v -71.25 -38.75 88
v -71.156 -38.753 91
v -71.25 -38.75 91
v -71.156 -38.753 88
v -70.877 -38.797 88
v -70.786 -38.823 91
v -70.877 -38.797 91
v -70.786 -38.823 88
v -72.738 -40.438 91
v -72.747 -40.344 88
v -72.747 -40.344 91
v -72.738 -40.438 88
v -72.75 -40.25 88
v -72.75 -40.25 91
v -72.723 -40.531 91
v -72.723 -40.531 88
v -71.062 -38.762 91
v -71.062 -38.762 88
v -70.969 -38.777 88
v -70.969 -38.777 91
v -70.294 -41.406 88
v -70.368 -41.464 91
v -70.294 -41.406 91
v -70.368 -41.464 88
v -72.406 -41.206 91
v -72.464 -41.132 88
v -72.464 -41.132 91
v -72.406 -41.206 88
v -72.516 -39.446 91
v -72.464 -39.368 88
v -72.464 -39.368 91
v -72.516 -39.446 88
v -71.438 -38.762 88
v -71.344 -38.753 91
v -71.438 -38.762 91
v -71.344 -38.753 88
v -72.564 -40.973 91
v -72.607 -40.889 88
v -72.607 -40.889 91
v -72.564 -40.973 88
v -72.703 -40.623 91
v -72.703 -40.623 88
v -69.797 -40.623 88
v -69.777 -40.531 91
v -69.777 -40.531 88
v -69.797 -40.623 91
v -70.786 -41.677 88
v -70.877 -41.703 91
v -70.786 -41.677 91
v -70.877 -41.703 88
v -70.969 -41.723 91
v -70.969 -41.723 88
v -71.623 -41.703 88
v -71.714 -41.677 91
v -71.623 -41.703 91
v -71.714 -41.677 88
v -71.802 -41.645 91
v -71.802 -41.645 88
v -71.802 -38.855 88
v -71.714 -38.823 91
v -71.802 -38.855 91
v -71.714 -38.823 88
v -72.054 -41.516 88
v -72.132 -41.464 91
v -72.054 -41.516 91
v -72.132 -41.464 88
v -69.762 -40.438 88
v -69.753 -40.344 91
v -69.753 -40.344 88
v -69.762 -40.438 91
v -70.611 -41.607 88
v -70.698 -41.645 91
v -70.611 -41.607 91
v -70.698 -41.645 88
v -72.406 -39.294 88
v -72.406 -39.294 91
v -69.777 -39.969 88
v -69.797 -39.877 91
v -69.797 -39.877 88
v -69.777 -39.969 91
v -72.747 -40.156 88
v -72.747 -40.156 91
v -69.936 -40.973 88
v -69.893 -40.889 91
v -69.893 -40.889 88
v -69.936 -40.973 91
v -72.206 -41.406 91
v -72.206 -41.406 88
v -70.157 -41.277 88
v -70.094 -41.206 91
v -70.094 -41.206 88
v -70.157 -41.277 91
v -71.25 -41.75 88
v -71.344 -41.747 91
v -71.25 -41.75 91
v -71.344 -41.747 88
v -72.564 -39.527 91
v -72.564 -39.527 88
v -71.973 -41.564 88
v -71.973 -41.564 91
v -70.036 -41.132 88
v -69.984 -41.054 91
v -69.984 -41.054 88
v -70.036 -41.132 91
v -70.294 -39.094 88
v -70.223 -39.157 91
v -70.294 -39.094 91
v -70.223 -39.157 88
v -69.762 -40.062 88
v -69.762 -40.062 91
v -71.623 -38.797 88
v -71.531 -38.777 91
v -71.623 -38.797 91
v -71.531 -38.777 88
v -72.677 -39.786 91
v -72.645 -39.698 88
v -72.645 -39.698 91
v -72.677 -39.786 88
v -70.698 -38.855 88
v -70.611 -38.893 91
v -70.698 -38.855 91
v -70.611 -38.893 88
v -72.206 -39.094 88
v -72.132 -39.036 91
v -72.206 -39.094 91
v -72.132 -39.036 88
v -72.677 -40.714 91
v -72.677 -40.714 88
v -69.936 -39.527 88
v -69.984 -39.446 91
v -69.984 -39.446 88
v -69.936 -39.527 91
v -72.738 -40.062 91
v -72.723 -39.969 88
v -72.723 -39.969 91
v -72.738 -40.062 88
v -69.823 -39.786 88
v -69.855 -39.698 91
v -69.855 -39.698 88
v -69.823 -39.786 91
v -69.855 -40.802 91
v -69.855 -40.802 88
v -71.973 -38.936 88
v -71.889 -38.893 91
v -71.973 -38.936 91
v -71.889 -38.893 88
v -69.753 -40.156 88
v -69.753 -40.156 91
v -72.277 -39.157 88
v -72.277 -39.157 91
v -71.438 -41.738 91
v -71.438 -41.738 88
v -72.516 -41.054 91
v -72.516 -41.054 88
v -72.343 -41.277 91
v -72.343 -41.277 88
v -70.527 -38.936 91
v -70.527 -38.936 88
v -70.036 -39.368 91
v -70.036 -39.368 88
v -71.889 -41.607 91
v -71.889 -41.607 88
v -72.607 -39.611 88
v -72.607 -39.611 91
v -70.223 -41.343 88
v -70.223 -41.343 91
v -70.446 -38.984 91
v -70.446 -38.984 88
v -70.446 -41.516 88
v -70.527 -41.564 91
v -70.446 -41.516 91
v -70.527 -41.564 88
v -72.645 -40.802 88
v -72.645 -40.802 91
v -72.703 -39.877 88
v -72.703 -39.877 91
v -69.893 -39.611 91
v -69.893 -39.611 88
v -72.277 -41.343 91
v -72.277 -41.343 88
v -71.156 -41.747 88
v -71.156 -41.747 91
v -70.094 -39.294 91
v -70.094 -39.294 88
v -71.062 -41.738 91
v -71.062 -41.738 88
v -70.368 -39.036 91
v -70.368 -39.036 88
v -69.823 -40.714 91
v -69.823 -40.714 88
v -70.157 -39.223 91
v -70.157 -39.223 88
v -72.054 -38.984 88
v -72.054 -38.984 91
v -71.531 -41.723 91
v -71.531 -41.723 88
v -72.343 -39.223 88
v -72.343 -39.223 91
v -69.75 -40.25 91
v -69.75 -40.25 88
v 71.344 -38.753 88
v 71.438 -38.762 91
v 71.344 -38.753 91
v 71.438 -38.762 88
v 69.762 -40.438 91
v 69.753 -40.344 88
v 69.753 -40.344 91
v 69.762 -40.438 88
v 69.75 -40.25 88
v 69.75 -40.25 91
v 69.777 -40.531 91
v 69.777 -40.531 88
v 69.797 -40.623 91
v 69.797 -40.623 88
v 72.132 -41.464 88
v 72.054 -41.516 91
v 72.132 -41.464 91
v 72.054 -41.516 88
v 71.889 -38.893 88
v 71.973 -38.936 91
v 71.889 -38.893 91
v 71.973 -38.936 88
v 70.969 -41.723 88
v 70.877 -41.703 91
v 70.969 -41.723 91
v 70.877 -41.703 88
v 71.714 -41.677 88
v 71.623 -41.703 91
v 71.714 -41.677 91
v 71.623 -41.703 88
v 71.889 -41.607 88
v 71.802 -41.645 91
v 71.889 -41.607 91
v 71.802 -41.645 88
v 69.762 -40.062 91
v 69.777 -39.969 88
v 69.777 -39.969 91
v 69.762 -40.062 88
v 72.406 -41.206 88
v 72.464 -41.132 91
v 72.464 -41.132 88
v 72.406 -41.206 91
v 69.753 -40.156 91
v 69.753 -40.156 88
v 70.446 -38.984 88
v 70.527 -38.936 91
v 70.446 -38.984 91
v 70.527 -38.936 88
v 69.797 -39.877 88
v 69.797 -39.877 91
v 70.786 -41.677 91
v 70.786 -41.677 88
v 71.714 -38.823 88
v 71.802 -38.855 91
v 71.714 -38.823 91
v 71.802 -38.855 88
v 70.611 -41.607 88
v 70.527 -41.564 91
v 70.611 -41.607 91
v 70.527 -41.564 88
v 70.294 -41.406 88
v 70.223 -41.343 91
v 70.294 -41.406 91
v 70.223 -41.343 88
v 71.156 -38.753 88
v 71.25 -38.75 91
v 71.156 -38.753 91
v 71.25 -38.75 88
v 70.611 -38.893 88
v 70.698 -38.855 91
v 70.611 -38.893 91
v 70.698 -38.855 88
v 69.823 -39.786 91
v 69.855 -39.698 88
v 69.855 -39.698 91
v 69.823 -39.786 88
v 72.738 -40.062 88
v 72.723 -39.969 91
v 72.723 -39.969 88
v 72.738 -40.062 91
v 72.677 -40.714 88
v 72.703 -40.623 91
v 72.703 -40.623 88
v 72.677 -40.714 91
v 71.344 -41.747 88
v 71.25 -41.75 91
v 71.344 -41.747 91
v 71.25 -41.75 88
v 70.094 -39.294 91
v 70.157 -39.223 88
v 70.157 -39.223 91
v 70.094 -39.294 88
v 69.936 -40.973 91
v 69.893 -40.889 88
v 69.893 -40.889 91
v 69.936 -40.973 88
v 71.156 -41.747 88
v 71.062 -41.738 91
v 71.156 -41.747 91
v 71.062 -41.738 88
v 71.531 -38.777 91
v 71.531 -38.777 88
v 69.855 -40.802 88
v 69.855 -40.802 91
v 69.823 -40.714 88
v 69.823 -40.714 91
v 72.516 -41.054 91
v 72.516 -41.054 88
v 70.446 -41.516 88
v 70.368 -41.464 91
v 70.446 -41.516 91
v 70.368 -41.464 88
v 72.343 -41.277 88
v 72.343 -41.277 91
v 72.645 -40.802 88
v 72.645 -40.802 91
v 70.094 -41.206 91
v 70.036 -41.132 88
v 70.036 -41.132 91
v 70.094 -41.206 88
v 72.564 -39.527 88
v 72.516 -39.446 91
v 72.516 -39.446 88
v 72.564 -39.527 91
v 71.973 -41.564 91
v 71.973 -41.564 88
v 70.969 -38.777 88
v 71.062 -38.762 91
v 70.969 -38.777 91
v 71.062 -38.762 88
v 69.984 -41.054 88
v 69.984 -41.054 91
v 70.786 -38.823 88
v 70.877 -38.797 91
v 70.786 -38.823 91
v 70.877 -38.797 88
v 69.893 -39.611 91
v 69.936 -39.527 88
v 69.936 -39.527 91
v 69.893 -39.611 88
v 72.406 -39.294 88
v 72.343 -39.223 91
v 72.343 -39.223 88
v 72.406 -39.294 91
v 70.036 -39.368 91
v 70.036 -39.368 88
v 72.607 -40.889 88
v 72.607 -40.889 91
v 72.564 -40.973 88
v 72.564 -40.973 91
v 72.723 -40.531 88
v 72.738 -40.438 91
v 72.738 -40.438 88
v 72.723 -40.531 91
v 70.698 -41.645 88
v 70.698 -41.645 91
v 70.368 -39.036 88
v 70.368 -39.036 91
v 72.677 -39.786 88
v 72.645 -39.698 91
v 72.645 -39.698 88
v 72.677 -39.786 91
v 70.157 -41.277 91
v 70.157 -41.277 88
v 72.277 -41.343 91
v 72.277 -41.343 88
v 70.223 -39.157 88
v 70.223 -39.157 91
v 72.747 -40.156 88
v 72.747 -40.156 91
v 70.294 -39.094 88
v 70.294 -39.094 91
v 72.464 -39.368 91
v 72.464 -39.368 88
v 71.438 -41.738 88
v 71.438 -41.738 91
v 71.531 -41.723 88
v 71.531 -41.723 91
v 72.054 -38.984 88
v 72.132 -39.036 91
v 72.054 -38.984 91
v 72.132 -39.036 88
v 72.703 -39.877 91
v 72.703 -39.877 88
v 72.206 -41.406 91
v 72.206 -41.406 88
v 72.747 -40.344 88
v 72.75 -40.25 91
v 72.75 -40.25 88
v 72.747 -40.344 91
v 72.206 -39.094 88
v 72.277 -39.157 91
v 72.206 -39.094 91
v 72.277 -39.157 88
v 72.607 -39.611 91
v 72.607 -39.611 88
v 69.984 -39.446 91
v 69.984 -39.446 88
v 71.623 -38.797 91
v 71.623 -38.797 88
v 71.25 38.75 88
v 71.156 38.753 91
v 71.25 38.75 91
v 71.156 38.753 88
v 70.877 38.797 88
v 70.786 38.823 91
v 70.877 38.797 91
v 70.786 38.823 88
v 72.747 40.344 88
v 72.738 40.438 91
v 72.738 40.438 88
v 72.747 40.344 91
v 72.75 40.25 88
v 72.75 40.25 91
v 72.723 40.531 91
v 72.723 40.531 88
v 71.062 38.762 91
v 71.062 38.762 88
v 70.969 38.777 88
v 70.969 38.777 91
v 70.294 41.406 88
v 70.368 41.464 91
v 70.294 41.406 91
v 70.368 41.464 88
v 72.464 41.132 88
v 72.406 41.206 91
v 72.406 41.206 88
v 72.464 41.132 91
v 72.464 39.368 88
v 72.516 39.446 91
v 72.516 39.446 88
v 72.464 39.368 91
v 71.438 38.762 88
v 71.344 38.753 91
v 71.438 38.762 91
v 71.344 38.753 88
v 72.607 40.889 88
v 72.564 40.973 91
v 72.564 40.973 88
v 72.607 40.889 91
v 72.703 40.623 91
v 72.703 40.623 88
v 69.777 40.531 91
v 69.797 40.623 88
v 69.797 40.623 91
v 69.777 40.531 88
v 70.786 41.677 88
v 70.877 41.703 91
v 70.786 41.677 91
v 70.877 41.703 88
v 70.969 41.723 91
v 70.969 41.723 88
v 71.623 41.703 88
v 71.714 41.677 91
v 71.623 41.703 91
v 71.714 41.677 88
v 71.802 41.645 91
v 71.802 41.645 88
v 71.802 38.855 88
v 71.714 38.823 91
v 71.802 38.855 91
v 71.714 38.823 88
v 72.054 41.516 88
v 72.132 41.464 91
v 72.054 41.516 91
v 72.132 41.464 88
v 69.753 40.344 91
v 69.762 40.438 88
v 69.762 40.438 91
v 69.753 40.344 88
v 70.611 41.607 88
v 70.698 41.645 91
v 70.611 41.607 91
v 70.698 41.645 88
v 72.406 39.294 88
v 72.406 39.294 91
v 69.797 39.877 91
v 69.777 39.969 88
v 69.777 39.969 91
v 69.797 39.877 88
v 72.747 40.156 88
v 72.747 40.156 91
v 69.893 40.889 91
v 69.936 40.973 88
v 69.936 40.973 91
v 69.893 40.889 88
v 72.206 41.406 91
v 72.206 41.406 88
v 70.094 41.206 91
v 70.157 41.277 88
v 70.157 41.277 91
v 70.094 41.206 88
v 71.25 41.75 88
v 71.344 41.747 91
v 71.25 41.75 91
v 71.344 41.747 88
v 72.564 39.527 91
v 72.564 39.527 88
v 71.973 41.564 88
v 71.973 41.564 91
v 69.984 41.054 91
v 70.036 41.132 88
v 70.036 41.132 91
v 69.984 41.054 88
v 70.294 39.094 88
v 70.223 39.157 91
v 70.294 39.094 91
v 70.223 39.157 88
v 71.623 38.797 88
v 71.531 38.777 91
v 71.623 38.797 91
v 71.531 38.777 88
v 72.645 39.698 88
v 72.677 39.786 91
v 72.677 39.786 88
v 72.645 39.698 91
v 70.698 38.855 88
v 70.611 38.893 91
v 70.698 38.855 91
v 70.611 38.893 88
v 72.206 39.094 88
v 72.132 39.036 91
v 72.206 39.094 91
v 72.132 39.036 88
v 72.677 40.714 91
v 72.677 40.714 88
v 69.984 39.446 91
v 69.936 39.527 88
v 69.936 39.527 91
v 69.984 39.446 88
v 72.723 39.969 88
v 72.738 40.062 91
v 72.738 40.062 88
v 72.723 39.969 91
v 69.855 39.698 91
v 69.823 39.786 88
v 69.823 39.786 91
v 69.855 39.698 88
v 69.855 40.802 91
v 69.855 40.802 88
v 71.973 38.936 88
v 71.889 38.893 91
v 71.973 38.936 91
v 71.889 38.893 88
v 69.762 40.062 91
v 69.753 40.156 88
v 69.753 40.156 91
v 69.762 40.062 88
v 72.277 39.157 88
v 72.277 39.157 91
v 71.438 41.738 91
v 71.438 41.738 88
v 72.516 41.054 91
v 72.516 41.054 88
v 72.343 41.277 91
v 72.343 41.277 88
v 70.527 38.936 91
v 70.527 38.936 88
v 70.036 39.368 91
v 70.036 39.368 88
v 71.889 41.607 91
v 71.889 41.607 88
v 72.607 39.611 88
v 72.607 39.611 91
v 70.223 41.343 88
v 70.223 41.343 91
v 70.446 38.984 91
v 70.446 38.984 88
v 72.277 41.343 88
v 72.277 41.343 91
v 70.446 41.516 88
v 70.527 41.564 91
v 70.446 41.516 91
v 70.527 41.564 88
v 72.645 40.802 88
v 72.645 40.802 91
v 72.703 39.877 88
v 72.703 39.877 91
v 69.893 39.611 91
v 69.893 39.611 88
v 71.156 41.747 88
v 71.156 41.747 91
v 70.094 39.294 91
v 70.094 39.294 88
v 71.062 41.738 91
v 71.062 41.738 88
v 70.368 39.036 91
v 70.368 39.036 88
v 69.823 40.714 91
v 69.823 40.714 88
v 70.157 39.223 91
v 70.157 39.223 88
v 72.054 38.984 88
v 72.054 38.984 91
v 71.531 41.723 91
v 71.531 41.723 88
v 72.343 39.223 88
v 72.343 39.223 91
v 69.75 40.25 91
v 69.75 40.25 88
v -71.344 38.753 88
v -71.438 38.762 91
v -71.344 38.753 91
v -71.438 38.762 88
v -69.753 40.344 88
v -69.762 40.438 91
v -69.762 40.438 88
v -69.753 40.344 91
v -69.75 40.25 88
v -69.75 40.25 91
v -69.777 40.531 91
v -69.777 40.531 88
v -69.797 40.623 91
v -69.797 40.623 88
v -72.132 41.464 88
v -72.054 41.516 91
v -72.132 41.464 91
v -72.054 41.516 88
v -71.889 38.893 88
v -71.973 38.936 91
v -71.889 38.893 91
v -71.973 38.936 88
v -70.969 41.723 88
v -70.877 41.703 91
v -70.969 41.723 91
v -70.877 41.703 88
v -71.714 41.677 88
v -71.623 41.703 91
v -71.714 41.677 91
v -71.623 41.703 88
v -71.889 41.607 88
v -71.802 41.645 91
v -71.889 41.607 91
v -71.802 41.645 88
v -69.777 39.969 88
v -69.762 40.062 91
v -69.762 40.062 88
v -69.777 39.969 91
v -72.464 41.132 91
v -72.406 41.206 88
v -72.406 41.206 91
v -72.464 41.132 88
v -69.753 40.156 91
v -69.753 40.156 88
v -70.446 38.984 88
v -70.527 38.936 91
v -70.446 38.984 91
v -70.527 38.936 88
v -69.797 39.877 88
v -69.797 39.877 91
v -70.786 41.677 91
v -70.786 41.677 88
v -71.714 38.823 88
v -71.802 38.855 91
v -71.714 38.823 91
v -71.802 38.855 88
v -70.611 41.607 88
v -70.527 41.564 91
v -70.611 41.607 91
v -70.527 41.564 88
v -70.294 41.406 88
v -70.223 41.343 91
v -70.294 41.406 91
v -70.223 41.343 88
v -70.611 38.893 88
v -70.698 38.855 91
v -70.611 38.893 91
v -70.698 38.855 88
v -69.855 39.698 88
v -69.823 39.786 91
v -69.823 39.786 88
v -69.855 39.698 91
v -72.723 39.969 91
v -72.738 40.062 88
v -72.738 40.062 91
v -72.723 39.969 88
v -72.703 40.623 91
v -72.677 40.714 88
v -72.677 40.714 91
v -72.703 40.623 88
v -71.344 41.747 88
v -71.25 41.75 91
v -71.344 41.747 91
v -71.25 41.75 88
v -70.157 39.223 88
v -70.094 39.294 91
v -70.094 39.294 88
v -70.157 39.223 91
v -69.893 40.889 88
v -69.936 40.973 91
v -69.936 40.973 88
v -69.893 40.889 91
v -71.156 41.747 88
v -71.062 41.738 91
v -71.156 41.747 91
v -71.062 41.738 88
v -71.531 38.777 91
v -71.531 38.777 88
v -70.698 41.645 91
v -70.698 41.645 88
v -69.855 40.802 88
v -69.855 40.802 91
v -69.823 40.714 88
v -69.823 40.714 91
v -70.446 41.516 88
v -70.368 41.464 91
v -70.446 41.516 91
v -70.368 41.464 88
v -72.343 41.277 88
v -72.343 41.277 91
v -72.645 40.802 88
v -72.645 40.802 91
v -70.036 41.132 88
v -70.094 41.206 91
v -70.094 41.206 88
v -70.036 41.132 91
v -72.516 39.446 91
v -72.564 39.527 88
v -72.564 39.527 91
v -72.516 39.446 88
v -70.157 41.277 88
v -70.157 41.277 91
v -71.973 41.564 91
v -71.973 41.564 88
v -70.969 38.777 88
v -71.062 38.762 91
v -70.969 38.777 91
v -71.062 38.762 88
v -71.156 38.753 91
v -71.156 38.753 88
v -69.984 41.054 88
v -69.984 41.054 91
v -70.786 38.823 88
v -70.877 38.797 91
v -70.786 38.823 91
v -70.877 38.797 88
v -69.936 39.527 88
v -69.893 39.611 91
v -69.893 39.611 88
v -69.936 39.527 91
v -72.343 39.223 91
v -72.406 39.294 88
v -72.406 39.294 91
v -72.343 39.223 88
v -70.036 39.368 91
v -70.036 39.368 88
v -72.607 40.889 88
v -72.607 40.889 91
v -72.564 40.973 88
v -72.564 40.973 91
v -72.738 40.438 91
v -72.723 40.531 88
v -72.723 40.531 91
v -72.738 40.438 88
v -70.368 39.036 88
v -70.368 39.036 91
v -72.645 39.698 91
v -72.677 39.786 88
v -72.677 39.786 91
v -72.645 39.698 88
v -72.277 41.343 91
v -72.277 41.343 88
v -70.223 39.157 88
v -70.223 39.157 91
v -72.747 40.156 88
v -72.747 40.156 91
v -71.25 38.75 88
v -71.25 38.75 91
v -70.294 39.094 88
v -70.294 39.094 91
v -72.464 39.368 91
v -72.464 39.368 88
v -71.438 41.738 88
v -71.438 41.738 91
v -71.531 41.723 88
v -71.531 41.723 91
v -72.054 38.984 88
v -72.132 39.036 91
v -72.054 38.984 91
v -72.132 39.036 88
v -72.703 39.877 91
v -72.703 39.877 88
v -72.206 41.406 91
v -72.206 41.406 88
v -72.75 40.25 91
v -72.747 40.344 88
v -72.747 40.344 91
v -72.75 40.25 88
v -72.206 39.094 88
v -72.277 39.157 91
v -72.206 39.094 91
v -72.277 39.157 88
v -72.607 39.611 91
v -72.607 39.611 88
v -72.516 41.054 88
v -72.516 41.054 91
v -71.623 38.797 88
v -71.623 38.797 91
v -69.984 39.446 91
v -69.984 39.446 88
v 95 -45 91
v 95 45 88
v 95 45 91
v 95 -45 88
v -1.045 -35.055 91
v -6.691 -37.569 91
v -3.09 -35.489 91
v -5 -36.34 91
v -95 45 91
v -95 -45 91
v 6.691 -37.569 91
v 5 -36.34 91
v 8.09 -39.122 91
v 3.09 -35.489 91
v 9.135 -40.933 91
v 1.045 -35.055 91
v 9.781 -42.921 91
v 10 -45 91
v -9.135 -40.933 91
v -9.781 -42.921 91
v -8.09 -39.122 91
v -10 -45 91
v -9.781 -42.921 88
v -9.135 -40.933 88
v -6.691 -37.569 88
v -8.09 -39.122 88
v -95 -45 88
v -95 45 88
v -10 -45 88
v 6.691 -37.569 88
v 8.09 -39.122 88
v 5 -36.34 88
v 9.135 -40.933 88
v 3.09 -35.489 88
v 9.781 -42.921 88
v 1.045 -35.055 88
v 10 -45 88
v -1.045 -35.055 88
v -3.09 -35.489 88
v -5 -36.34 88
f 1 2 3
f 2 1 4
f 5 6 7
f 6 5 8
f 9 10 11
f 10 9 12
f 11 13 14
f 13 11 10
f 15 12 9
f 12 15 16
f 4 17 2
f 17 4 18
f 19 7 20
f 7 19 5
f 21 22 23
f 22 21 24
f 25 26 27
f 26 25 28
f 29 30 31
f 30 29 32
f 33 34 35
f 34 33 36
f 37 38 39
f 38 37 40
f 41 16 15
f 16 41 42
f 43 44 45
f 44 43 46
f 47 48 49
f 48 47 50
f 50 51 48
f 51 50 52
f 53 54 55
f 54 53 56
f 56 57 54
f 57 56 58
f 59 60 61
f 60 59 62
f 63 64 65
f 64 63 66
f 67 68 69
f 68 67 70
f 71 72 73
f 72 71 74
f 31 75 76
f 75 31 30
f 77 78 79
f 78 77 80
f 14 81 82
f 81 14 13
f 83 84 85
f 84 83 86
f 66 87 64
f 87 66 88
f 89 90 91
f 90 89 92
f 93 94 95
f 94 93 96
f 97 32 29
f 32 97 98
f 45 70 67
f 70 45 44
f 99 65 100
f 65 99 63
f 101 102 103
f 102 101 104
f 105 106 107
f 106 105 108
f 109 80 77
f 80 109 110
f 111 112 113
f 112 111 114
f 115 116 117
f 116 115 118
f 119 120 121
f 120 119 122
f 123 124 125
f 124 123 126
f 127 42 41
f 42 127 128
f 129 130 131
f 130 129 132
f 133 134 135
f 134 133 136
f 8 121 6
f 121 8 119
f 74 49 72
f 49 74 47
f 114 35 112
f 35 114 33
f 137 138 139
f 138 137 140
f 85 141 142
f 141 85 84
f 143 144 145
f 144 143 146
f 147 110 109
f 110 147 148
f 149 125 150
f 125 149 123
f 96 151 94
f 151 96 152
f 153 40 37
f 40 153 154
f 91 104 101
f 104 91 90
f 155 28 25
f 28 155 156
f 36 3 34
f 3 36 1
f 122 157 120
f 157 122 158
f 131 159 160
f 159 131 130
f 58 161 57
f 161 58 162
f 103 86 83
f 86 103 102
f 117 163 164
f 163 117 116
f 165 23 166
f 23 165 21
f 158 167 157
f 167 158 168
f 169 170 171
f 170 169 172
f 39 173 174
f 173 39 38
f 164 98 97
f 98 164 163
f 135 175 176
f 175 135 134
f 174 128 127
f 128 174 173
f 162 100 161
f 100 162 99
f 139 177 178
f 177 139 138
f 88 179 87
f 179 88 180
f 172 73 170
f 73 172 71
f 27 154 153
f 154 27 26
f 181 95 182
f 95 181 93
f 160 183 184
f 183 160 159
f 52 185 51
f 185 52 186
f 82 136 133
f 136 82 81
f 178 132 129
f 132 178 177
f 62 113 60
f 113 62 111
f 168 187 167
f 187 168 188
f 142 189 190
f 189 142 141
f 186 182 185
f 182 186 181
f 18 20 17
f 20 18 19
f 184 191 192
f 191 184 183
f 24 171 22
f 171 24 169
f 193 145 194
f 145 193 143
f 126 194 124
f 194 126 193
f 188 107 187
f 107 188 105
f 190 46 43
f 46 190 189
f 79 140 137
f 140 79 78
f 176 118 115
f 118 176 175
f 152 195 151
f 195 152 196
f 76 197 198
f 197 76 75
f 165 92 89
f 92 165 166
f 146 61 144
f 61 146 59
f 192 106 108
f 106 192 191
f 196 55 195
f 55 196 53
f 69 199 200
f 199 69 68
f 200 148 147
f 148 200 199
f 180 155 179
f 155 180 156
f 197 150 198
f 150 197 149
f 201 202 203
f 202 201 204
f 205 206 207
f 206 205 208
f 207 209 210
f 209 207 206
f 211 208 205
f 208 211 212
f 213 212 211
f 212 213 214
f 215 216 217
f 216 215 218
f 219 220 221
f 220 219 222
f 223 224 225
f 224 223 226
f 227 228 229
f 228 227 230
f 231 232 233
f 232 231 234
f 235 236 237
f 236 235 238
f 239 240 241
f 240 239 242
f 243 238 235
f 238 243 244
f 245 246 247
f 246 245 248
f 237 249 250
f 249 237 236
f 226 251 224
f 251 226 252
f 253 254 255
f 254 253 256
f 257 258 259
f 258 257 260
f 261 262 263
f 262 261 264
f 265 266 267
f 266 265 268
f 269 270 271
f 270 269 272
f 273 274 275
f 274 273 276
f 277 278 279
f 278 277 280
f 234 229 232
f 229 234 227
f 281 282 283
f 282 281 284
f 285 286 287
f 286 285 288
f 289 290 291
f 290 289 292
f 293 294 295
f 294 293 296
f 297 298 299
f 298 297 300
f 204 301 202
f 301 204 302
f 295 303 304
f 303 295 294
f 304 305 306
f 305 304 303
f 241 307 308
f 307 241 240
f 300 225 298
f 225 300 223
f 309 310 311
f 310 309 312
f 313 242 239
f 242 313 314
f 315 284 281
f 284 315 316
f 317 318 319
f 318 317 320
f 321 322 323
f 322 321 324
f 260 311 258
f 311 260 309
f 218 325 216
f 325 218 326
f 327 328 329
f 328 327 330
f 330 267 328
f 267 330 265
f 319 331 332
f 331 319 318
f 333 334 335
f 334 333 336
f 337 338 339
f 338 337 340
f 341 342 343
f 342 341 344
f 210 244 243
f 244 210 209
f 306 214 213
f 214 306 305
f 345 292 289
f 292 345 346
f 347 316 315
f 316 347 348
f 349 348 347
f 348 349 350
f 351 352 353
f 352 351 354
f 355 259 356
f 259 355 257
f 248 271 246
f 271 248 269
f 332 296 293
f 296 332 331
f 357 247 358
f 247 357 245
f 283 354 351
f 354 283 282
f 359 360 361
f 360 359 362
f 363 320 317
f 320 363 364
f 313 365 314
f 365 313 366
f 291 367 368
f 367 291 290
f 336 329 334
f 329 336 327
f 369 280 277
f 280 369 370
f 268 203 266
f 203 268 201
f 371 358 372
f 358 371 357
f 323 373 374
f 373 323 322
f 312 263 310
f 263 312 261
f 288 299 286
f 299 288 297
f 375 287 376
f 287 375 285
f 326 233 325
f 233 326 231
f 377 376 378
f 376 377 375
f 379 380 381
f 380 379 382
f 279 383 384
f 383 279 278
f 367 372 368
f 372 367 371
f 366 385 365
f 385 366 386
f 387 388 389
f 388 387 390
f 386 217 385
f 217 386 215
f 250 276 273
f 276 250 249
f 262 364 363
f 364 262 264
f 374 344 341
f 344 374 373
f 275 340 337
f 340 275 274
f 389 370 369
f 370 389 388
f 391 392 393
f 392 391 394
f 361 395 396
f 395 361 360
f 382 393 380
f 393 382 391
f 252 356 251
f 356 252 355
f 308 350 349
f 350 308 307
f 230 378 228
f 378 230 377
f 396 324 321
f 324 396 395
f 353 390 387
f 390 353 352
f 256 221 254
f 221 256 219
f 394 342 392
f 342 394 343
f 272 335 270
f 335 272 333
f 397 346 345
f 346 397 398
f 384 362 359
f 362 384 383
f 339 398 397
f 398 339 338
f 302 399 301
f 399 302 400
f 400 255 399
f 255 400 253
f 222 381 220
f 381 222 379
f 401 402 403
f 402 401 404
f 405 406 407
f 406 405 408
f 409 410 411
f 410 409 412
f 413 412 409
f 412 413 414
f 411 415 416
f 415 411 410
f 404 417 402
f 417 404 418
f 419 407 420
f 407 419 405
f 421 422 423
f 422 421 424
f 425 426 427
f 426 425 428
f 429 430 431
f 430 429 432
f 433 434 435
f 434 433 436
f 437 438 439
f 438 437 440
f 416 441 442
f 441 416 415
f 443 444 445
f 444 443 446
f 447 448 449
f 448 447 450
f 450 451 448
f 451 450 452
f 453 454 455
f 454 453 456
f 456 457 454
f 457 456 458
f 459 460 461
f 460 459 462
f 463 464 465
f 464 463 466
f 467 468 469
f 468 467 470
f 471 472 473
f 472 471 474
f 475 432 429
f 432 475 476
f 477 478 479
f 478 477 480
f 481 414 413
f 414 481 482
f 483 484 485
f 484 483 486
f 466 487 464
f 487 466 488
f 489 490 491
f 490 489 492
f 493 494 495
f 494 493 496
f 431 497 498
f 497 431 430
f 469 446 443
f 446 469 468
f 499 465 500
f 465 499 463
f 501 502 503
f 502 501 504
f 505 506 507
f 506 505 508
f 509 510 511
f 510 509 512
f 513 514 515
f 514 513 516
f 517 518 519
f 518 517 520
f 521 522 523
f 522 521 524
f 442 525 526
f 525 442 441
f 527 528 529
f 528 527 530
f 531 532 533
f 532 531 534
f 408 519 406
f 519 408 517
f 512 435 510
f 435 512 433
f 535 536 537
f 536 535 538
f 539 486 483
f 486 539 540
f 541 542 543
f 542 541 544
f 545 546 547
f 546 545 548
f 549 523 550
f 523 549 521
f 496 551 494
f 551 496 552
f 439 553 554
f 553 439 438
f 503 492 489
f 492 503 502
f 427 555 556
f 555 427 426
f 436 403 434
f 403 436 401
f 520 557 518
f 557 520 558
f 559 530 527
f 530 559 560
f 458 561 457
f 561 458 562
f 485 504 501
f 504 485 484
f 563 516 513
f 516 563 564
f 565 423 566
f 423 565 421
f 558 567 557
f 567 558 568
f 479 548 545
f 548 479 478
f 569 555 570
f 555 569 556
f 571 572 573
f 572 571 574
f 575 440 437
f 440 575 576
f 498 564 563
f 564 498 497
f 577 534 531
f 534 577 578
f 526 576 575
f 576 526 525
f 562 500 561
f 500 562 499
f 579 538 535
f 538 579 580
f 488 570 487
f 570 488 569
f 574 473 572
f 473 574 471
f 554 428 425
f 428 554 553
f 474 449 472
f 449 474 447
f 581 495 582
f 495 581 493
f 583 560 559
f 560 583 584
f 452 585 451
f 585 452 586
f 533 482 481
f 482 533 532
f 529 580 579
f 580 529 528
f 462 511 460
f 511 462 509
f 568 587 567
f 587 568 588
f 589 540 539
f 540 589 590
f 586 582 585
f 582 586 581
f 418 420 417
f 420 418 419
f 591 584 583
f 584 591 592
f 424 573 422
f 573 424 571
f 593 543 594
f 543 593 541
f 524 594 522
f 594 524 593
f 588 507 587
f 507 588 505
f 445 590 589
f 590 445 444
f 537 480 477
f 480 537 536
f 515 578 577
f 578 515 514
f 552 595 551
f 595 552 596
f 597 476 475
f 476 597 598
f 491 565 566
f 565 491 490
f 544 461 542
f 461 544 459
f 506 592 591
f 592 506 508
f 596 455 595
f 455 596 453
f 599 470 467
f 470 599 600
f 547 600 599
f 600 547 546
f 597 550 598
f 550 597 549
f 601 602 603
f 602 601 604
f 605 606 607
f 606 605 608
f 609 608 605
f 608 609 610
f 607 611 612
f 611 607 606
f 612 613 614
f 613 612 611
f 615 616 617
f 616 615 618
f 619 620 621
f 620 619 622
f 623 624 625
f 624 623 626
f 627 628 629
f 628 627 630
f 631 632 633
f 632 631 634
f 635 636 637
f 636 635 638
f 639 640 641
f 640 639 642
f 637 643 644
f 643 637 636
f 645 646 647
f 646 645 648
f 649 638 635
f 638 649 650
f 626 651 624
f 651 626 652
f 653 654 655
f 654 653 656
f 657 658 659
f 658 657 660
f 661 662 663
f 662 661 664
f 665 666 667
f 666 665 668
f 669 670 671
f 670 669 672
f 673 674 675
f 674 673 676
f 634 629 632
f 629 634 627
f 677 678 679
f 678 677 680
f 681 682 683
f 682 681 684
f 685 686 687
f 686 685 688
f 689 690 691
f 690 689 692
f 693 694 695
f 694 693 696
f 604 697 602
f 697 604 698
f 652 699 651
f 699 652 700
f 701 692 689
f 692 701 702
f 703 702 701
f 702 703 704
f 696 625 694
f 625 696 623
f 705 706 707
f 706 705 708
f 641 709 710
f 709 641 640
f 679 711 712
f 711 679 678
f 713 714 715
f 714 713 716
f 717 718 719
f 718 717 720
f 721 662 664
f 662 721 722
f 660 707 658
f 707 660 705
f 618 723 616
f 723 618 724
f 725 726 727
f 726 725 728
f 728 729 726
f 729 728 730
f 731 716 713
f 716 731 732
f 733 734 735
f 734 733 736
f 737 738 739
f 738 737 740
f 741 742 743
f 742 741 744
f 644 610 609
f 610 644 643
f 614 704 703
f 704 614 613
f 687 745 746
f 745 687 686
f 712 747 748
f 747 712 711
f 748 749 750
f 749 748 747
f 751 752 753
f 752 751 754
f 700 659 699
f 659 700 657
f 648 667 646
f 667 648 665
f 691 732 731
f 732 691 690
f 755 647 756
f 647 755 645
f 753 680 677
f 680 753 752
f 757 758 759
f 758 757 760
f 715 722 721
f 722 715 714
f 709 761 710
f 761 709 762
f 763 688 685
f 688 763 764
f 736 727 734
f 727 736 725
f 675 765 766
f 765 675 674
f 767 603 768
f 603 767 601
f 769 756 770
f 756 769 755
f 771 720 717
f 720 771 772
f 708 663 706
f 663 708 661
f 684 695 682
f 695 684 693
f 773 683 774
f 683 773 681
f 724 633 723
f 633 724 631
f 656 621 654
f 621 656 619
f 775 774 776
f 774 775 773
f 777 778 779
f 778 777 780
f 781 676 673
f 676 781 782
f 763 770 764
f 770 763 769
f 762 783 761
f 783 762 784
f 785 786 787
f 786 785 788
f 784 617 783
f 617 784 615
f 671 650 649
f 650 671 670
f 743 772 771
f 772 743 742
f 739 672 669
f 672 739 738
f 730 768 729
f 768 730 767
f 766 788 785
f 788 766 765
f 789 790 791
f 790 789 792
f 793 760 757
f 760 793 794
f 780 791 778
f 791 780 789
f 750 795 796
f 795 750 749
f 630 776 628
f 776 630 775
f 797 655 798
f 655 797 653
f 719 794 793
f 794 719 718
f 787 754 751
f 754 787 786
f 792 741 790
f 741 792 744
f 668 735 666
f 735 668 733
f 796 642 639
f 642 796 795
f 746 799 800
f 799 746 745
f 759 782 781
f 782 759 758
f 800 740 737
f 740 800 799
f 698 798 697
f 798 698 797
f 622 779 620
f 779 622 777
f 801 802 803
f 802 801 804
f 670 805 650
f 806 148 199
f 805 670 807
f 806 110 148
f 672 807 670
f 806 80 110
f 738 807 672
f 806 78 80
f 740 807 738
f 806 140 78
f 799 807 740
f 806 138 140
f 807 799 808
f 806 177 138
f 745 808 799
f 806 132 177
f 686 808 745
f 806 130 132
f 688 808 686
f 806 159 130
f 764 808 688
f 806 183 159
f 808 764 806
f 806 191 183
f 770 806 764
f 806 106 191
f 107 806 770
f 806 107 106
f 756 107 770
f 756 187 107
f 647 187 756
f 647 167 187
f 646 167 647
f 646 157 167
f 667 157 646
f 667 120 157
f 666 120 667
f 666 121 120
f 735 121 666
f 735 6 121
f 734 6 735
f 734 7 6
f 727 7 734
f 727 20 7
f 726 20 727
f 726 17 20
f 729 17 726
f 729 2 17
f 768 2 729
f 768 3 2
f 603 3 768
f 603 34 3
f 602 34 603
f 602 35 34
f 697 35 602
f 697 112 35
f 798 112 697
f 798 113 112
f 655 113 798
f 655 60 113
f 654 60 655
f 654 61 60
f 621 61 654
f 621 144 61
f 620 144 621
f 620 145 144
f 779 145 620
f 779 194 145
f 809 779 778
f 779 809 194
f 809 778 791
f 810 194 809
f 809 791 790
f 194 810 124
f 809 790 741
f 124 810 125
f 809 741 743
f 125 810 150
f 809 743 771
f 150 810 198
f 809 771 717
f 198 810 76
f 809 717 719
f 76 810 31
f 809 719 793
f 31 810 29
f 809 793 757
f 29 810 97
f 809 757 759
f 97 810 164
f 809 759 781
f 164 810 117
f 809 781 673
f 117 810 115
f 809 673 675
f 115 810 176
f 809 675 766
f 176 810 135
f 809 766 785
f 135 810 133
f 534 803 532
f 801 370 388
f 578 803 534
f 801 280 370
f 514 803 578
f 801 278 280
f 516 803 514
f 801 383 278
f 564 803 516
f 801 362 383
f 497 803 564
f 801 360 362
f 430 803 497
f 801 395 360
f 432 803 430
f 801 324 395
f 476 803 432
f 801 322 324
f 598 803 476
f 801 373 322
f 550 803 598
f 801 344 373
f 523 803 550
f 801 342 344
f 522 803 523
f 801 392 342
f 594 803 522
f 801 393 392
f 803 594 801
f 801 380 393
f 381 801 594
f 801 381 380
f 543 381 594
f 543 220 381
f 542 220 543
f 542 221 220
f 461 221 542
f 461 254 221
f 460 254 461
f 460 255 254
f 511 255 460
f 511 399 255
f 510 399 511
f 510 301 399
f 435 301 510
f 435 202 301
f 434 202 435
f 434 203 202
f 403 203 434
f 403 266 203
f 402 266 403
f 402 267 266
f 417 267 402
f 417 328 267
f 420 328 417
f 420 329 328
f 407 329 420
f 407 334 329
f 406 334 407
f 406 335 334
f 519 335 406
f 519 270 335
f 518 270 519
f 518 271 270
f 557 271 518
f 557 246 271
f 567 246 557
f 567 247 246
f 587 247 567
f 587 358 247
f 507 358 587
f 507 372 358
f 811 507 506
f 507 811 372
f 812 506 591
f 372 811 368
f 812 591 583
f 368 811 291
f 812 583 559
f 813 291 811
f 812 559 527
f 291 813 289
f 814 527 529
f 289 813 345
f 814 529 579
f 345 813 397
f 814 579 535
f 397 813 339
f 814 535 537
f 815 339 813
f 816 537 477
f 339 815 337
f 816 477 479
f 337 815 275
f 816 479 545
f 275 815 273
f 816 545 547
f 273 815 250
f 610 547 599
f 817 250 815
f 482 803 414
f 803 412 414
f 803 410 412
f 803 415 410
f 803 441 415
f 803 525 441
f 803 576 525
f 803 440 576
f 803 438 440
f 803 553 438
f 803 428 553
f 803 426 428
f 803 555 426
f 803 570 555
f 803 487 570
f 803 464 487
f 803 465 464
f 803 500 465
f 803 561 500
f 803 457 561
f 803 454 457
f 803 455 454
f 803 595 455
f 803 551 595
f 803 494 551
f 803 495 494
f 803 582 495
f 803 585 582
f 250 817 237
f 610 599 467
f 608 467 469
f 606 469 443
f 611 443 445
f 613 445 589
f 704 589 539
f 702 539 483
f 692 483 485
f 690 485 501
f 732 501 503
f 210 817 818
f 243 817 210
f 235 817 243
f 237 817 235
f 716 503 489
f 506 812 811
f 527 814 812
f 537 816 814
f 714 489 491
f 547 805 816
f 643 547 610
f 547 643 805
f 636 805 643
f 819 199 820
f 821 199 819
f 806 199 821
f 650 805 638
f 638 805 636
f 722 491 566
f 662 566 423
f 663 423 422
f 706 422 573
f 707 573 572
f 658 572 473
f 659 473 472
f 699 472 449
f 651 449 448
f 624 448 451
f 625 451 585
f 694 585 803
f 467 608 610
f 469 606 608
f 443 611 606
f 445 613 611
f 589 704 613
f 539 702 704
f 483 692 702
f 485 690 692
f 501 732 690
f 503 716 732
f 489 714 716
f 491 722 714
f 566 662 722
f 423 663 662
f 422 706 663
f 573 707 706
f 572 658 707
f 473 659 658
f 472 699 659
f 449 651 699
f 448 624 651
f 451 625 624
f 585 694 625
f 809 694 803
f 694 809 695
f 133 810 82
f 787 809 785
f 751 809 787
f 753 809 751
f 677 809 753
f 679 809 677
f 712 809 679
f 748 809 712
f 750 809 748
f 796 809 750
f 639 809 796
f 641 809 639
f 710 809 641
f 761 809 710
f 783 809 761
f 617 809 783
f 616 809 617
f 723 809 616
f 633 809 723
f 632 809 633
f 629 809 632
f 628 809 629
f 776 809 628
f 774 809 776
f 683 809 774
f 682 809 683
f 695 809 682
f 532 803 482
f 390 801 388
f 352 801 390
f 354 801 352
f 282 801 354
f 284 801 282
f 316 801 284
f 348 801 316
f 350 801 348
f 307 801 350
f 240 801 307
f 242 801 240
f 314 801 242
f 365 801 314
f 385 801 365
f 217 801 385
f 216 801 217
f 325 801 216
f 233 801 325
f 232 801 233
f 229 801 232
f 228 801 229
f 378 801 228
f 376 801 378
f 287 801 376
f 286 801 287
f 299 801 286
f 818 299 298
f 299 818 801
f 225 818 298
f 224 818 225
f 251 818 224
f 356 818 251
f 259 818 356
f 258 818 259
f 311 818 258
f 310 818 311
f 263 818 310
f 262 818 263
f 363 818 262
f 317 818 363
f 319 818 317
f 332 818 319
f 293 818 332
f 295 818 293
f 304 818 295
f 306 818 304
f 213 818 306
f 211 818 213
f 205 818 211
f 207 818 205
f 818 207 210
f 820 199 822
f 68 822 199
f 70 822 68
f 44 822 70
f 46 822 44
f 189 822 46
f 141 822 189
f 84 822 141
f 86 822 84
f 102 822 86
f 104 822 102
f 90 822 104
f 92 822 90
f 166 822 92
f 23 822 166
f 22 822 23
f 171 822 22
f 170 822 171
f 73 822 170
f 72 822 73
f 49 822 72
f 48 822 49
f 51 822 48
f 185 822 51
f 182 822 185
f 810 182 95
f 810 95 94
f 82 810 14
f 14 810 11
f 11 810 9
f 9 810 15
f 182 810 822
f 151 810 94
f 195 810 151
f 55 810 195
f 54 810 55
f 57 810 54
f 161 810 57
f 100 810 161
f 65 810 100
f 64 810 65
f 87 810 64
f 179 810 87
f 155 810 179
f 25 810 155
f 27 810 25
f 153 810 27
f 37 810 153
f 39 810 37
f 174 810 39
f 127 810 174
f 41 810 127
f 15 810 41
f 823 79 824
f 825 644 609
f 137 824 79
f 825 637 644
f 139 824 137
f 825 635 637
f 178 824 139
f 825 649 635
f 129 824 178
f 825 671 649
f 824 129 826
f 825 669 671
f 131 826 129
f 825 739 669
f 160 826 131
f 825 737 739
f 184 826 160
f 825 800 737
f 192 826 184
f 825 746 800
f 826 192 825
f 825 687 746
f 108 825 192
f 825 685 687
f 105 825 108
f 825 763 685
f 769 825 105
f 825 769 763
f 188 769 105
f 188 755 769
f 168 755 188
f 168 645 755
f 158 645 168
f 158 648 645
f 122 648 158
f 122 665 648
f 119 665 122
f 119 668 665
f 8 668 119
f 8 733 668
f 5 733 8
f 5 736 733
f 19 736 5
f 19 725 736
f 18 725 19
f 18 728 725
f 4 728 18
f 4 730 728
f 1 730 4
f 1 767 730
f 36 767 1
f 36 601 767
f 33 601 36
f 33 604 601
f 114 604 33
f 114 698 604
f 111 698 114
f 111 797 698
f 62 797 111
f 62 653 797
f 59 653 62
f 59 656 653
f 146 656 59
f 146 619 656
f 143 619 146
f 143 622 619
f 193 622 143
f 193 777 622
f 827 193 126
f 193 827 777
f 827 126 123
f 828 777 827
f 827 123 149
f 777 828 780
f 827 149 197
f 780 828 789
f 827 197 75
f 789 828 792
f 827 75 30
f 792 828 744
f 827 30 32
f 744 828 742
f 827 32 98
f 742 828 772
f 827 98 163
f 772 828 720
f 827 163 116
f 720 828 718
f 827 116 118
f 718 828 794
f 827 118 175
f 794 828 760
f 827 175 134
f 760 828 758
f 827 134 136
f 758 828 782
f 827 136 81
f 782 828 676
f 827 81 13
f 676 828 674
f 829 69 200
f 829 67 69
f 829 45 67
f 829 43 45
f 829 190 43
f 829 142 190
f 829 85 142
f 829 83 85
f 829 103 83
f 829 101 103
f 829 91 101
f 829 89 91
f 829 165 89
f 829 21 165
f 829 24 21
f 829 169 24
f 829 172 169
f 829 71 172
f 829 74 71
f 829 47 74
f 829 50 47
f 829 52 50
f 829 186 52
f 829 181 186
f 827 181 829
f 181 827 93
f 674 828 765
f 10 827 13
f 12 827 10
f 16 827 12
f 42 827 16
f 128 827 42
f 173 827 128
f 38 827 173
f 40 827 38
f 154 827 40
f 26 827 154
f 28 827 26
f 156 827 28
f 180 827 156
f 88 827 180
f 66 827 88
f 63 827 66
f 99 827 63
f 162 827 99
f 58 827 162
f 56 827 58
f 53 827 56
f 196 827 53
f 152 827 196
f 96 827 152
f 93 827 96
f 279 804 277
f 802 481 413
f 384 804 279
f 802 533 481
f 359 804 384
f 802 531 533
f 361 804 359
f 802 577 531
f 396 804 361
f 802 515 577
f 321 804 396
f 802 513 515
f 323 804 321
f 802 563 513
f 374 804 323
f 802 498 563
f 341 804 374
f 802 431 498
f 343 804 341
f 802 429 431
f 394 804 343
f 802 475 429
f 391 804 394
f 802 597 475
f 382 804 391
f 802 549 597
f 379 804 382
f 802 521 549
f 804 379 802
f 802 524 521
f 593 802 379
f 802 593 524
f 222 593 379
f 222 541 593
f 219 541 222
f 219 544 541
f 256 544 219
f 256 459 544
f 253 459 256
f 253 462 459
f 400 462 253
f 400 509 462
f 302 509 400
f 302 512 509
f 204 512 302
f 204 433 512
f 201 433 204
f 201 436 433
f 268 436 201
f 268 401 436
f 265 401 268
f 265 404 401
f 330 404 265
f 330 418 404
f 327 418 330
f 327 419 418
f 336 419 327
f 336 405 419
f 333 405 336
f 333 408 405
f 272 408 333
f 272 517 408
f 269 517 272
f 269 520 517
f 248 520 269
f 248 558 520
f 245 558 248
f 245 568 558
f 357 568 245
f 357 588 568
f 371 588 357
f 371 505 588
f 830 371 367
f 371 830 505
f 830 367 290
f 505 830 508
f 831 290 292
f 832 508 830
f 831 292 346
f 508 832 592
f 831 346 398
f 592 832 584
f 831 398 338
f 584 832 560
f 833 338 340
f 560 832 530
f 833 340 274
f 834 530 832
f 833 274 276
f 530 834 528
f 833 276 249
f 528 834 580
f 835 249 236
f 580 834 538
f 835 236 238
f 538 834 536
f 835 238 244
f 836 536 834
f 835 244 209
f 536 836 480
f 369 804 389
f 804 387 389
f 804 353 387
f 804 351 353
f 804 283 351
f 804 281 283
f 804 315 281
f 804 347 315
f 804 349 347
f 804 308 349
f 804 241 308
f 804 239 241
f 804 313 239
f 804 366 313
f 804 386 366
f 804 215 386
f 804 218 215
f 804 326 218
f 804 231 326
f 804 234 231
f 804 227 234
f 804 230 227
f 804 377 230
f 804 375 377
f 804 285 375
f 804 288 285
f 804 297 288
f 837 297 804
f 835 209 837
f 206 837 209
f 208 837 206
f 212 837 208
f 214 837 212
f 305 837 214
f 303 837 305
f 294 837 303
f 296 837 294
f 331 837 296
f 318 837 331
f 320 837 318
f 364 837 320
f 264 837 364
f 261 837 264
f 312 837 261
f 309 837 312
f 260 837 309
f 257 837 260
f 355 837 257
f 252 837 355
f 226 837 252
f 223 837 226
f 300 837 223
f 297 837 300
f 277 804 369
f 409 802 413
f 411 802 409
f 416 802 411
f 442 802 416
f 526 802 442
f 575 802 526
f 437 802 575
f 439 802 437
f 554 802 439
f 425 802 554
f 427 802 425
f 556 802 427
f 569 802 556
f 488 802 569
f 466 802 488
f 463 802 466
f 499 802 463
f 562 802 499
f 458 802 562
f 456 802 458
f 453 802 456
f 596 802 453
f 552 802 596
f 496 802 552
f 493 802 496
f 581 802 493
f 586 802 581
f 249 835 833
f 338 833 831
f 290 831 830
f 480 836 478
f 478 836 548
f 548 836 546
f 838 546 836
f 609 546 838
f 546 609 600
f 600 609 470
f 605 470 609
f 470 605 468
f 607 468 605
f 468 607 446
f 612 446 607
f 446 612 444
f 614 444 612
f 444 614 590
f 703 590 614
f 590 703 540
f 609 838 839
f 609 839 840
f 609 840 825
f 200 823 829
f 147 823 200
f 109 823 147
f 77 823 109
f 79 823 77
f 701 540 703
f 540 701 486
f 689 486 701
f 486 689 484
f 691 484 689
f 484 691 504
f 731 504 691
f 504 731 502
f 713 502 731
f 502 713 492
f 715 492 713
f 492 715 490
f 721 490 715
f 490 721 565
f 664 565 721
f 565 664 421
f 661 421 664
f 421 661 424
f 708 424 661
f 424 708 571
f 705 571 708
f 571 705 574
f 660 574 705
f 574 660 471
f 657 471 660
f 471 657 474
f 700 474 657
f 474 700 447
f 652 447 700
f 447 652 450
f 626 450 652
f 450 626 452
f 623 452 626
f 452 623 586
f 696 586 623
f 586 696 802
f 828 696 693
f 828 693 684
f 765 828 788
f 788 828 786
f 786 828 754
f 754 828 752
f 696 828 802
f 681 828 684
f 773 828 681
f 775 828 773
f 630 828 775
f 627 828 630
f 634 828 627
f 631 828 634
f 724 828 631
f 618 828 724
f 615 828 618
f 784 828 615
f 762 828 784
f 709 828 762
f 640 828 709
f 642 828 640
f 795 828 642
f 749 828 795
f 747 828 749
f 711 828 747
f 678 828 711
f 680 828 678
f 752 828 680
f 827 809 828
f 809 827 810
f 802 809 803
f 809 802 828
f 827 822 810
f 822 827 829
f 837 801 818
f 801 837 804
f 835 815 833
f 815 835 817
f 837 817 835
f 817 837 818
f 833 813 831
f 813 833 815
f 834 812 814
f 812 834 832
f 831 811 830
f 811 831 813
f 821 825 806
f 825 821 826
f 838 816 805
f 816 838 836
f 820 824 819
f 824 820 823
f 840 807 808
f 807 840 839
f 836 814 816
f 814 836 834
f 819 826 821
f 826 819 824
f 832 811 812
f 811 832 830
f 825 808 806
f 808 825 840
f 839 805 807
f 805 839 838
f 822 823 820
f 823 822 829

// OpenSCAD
mainSize = [190, 90, 7];
groundZ = 80;
groundY = 3;

displaySize = [80.8, 53.2, 1000 ];
displayOutBounds = [ displaySize.x + 2 + 4, displaySize.y + 2 + 2, 7];

ground = (mainSize.y - displayOutBounds.y);
stand = [ 41, ground * 0.5, 30 ];

module front()
{
	difference()
	{
		intersection()
		{
			cube( mainSize, true );

			radius = mainSize.z;

			hull(){
				$fn = 100;
				rotate( 90, [1, 0 ,0] )
					translate( [mainSize.x *0.5 - radius, mainSize.z * 0.5, -mainSize.y * 0.5 ] ) 
					cylinder( mainSize.y, radius, mainSize.z);
				rotate( 90, [1, 0 ,0] )
					translate( [-mainSize.x *0.5 + radius, mainSize.z * 0.5, -mainSize.y * 0.5 ] ) 
					cylinder( mainSize.y, radius, mainSize.z);
			}
		}
		translate( [0,0,1])
		{
			cube( displayOutBounds, true );
		}	
		translate( [1,0,1])
		{
			cube(displaySize,true);
		}
	}
}

module stand()
{
	union()
	{
/*		color("red")
			translate( [0, -(displayOutBounds.y*0.5 + mainSize.y*0.5) * 0.5, mainSize.z*0.5 + stand.z * 0.5 ] )
			cube(stand, true);

		smallStand = 8;
		color("red")
			translate( [-displayOutBounds.x *0.5 + smallStand*0.5,
					-(displayOutBounds.y*0.5 + mainSize.y*0.5) * 0.5, 
					mainSize.z*0.5 + stand.z * 0.5  ] )
			cube( [smallStand, stand.y, stand.z], true);
*/
		color("red")
			translate( [0, -(mainSize.y*0.5 ) + groundY * 0.5, groundZ*0.5 + mainSize.z * 0.5 ] )
			cube( [mainSize.x, groundY, groundZ] , true);
	}
}

module usb()
{
	hole = 20;
	translate( [0,displayOutBounds.y*0.5 - hole, 0] )
		mirror([-1, 0, 0]){
			cube( [displayOutBounds.x * 0.5 + 45, hole, 10]);
		}
}

module frontWithUsb()
{
	difference()
	{
		front();
		usb();
		displayScrewHoles();
	}
}

module sides()
{
	color("green"){
		translate( [mainSize.x * 0.5 - groundY,-mainSize.y*0.5 + groundY, mainSize.z * 0.5] ) 
		{
			cube([groundY, mainSize.y - groundY, groundZ], false); 
		}
		translate( [-mainSize.x * 0.5 ,-mainSize.y*0.5 + groundY, mainSize.z * 0.5] ) 
		{
			cube([groundY, mainSize.y - groundY, groundZ], false); 
		}
	}
}

module top()
{
	translate( [0, mainSize.y*0.5 - groundY*0.5,groundZ*0.5 + mainSize.z*0.5] ) 
	{
		cube([mainSize.x - groundY*2 , groundY, groundZ], true); 
	}
}

module back()
{
	color("blue")
		translate( [0, 0, groundZ + groundY * 2] )
#cube( [mainSize.x, mainSize.y, groundY], true);
}

zatschelW = 7;
module zatschel()
{
	zatschelW = 7;
	l = 20;
	translate( [0,0, -l*.5] )
		difference()
		{
			cylinder(l, 0, zatschelW, true); 
			translate( [0,5,0] ) 
				cube([100, 10, 100], true);
		}
}

leftTop = 		[mainSize.x * 0.75 * 0.5, mainSize.y*0.5 - groundY, -mainSize.z * 0.5 + groundZ + mainSize.z];
rightTop = 		[-mainSize.x * 0.75 * 0.5, mainSize.y*0.5 - groundY, -mainSize.z * 0.5 + groundZ + mainSize.z];
leftBottom = 	[mainSize.x * 0.75 * 0.5, mainSize.y*0.5 - groundY, -mainSize.z * 0.5 + groundZ + mainSize.z];
rightBottom =  	[-mainSize.x * 0.75 * 0.5, mainSize.y*0.5 - groundY, -mainSize.z * 0.5 + groundZ + mainSize.z];

module zatschelS()
{
	translate( leftTop )
	zatschel();
	translate(rightTop)
	zatschel();

	rotate(180, [0,0,1] )
	{
		translate(leftBottom)
		zatschel();
		translate(rightBottom)
		zatschel();
	}
}

module backHoles(w)
{
	l = 30;
	//w = 2;
	$fn = 100;
	translate(leftTop )
	translate([0,-zatschelW*0.25,0])
	cylinder(l, w,w, true);
	translate(rightTop)
	translate([0,-zatschelW*0.25,0])
	cylinder(l, w,w, true);

	rotate(180, [0,0,1] )
	{
	translate(leftBottom)
	translate([0,-zatschelW*0.25,0])
	cylinder(l, w,w, true);
	translate(rightBottom)
	translate([0,-zatschelW*0.25,0])
	cylinder(l, w,w, true);
	}
}

module cableHole()
{
	translate( [0, -mainSize.y * 0.5, 0] )
	cylinder(1000, 10, 10, true);
}

module displayScrewHoles()
{
	$fs = 0.01;
	holeRadius = 1.5;
	x = 27.5;
	h = 10;
	y = 3;

	translate( [x, displayOutBounds.y * 0.5 + 2 + holeRadius, y ] ) 
	cylinder(h, holeRadius,holeRadius, true);
	translate( [-x, displayOutBounds.y * 0.5 + 2 + holeRadius, y ] ) 
	cylinder(h, holeRadius,holeRadius, true);
	translate( [x, -displayOutBounds.y * 0.5 - 2 - holeRadius, y ] ) 
	cylinder(h, holeRadius,holeRadius, true);
	translate( [-x, -displayOutBounds.y * 0.5 - 2 - holeRadius, y ] ) 
	cylinder(h, holeRadius,holeRadius, true);
}

module speakerHoles()
{
	$fs = 0.1;
	$fa = 0.1;
	translate( [0,0, mainSize.z * 0.5 + groundZ * 0.5 ] )
	{
		rotate( [0,90,0] )
		{
			speakerSize = 52;
			#cylinder(200, speakerSize * 0.5, speakerSize * 0.5, true);

			screwSize = 2;
			translate( [22,22, 22] )
			cylinder(300, screwSize, screwSize, true);
			translate( [-22,22, 22] )
			cylinder(300, screwSize, screwSize, true);
			translate( [-22,-22, 22] )
			cylinder(300, screwSize, screwSize, true);
			translate( [22,-22, 22] )
			cylinder(300, screwSize, screwSize, true);
		}
	}
}

//main
translate([0,0, mainSize.z * 0.5])
union() 
{

// Main
/* 
	frontWithUsb();
	stand();
	difference()
	{
		sides();
		speakerHoles();
	}
	top();

	
	difference()
	{
		zatschelS();
		backHoles(1);
	}
*/

	//displayScrewHoles();
    
    
//BackPlate
	difference()
	{
		back();
		backHoles(1.5);
		cableHole();
	}
    
}
